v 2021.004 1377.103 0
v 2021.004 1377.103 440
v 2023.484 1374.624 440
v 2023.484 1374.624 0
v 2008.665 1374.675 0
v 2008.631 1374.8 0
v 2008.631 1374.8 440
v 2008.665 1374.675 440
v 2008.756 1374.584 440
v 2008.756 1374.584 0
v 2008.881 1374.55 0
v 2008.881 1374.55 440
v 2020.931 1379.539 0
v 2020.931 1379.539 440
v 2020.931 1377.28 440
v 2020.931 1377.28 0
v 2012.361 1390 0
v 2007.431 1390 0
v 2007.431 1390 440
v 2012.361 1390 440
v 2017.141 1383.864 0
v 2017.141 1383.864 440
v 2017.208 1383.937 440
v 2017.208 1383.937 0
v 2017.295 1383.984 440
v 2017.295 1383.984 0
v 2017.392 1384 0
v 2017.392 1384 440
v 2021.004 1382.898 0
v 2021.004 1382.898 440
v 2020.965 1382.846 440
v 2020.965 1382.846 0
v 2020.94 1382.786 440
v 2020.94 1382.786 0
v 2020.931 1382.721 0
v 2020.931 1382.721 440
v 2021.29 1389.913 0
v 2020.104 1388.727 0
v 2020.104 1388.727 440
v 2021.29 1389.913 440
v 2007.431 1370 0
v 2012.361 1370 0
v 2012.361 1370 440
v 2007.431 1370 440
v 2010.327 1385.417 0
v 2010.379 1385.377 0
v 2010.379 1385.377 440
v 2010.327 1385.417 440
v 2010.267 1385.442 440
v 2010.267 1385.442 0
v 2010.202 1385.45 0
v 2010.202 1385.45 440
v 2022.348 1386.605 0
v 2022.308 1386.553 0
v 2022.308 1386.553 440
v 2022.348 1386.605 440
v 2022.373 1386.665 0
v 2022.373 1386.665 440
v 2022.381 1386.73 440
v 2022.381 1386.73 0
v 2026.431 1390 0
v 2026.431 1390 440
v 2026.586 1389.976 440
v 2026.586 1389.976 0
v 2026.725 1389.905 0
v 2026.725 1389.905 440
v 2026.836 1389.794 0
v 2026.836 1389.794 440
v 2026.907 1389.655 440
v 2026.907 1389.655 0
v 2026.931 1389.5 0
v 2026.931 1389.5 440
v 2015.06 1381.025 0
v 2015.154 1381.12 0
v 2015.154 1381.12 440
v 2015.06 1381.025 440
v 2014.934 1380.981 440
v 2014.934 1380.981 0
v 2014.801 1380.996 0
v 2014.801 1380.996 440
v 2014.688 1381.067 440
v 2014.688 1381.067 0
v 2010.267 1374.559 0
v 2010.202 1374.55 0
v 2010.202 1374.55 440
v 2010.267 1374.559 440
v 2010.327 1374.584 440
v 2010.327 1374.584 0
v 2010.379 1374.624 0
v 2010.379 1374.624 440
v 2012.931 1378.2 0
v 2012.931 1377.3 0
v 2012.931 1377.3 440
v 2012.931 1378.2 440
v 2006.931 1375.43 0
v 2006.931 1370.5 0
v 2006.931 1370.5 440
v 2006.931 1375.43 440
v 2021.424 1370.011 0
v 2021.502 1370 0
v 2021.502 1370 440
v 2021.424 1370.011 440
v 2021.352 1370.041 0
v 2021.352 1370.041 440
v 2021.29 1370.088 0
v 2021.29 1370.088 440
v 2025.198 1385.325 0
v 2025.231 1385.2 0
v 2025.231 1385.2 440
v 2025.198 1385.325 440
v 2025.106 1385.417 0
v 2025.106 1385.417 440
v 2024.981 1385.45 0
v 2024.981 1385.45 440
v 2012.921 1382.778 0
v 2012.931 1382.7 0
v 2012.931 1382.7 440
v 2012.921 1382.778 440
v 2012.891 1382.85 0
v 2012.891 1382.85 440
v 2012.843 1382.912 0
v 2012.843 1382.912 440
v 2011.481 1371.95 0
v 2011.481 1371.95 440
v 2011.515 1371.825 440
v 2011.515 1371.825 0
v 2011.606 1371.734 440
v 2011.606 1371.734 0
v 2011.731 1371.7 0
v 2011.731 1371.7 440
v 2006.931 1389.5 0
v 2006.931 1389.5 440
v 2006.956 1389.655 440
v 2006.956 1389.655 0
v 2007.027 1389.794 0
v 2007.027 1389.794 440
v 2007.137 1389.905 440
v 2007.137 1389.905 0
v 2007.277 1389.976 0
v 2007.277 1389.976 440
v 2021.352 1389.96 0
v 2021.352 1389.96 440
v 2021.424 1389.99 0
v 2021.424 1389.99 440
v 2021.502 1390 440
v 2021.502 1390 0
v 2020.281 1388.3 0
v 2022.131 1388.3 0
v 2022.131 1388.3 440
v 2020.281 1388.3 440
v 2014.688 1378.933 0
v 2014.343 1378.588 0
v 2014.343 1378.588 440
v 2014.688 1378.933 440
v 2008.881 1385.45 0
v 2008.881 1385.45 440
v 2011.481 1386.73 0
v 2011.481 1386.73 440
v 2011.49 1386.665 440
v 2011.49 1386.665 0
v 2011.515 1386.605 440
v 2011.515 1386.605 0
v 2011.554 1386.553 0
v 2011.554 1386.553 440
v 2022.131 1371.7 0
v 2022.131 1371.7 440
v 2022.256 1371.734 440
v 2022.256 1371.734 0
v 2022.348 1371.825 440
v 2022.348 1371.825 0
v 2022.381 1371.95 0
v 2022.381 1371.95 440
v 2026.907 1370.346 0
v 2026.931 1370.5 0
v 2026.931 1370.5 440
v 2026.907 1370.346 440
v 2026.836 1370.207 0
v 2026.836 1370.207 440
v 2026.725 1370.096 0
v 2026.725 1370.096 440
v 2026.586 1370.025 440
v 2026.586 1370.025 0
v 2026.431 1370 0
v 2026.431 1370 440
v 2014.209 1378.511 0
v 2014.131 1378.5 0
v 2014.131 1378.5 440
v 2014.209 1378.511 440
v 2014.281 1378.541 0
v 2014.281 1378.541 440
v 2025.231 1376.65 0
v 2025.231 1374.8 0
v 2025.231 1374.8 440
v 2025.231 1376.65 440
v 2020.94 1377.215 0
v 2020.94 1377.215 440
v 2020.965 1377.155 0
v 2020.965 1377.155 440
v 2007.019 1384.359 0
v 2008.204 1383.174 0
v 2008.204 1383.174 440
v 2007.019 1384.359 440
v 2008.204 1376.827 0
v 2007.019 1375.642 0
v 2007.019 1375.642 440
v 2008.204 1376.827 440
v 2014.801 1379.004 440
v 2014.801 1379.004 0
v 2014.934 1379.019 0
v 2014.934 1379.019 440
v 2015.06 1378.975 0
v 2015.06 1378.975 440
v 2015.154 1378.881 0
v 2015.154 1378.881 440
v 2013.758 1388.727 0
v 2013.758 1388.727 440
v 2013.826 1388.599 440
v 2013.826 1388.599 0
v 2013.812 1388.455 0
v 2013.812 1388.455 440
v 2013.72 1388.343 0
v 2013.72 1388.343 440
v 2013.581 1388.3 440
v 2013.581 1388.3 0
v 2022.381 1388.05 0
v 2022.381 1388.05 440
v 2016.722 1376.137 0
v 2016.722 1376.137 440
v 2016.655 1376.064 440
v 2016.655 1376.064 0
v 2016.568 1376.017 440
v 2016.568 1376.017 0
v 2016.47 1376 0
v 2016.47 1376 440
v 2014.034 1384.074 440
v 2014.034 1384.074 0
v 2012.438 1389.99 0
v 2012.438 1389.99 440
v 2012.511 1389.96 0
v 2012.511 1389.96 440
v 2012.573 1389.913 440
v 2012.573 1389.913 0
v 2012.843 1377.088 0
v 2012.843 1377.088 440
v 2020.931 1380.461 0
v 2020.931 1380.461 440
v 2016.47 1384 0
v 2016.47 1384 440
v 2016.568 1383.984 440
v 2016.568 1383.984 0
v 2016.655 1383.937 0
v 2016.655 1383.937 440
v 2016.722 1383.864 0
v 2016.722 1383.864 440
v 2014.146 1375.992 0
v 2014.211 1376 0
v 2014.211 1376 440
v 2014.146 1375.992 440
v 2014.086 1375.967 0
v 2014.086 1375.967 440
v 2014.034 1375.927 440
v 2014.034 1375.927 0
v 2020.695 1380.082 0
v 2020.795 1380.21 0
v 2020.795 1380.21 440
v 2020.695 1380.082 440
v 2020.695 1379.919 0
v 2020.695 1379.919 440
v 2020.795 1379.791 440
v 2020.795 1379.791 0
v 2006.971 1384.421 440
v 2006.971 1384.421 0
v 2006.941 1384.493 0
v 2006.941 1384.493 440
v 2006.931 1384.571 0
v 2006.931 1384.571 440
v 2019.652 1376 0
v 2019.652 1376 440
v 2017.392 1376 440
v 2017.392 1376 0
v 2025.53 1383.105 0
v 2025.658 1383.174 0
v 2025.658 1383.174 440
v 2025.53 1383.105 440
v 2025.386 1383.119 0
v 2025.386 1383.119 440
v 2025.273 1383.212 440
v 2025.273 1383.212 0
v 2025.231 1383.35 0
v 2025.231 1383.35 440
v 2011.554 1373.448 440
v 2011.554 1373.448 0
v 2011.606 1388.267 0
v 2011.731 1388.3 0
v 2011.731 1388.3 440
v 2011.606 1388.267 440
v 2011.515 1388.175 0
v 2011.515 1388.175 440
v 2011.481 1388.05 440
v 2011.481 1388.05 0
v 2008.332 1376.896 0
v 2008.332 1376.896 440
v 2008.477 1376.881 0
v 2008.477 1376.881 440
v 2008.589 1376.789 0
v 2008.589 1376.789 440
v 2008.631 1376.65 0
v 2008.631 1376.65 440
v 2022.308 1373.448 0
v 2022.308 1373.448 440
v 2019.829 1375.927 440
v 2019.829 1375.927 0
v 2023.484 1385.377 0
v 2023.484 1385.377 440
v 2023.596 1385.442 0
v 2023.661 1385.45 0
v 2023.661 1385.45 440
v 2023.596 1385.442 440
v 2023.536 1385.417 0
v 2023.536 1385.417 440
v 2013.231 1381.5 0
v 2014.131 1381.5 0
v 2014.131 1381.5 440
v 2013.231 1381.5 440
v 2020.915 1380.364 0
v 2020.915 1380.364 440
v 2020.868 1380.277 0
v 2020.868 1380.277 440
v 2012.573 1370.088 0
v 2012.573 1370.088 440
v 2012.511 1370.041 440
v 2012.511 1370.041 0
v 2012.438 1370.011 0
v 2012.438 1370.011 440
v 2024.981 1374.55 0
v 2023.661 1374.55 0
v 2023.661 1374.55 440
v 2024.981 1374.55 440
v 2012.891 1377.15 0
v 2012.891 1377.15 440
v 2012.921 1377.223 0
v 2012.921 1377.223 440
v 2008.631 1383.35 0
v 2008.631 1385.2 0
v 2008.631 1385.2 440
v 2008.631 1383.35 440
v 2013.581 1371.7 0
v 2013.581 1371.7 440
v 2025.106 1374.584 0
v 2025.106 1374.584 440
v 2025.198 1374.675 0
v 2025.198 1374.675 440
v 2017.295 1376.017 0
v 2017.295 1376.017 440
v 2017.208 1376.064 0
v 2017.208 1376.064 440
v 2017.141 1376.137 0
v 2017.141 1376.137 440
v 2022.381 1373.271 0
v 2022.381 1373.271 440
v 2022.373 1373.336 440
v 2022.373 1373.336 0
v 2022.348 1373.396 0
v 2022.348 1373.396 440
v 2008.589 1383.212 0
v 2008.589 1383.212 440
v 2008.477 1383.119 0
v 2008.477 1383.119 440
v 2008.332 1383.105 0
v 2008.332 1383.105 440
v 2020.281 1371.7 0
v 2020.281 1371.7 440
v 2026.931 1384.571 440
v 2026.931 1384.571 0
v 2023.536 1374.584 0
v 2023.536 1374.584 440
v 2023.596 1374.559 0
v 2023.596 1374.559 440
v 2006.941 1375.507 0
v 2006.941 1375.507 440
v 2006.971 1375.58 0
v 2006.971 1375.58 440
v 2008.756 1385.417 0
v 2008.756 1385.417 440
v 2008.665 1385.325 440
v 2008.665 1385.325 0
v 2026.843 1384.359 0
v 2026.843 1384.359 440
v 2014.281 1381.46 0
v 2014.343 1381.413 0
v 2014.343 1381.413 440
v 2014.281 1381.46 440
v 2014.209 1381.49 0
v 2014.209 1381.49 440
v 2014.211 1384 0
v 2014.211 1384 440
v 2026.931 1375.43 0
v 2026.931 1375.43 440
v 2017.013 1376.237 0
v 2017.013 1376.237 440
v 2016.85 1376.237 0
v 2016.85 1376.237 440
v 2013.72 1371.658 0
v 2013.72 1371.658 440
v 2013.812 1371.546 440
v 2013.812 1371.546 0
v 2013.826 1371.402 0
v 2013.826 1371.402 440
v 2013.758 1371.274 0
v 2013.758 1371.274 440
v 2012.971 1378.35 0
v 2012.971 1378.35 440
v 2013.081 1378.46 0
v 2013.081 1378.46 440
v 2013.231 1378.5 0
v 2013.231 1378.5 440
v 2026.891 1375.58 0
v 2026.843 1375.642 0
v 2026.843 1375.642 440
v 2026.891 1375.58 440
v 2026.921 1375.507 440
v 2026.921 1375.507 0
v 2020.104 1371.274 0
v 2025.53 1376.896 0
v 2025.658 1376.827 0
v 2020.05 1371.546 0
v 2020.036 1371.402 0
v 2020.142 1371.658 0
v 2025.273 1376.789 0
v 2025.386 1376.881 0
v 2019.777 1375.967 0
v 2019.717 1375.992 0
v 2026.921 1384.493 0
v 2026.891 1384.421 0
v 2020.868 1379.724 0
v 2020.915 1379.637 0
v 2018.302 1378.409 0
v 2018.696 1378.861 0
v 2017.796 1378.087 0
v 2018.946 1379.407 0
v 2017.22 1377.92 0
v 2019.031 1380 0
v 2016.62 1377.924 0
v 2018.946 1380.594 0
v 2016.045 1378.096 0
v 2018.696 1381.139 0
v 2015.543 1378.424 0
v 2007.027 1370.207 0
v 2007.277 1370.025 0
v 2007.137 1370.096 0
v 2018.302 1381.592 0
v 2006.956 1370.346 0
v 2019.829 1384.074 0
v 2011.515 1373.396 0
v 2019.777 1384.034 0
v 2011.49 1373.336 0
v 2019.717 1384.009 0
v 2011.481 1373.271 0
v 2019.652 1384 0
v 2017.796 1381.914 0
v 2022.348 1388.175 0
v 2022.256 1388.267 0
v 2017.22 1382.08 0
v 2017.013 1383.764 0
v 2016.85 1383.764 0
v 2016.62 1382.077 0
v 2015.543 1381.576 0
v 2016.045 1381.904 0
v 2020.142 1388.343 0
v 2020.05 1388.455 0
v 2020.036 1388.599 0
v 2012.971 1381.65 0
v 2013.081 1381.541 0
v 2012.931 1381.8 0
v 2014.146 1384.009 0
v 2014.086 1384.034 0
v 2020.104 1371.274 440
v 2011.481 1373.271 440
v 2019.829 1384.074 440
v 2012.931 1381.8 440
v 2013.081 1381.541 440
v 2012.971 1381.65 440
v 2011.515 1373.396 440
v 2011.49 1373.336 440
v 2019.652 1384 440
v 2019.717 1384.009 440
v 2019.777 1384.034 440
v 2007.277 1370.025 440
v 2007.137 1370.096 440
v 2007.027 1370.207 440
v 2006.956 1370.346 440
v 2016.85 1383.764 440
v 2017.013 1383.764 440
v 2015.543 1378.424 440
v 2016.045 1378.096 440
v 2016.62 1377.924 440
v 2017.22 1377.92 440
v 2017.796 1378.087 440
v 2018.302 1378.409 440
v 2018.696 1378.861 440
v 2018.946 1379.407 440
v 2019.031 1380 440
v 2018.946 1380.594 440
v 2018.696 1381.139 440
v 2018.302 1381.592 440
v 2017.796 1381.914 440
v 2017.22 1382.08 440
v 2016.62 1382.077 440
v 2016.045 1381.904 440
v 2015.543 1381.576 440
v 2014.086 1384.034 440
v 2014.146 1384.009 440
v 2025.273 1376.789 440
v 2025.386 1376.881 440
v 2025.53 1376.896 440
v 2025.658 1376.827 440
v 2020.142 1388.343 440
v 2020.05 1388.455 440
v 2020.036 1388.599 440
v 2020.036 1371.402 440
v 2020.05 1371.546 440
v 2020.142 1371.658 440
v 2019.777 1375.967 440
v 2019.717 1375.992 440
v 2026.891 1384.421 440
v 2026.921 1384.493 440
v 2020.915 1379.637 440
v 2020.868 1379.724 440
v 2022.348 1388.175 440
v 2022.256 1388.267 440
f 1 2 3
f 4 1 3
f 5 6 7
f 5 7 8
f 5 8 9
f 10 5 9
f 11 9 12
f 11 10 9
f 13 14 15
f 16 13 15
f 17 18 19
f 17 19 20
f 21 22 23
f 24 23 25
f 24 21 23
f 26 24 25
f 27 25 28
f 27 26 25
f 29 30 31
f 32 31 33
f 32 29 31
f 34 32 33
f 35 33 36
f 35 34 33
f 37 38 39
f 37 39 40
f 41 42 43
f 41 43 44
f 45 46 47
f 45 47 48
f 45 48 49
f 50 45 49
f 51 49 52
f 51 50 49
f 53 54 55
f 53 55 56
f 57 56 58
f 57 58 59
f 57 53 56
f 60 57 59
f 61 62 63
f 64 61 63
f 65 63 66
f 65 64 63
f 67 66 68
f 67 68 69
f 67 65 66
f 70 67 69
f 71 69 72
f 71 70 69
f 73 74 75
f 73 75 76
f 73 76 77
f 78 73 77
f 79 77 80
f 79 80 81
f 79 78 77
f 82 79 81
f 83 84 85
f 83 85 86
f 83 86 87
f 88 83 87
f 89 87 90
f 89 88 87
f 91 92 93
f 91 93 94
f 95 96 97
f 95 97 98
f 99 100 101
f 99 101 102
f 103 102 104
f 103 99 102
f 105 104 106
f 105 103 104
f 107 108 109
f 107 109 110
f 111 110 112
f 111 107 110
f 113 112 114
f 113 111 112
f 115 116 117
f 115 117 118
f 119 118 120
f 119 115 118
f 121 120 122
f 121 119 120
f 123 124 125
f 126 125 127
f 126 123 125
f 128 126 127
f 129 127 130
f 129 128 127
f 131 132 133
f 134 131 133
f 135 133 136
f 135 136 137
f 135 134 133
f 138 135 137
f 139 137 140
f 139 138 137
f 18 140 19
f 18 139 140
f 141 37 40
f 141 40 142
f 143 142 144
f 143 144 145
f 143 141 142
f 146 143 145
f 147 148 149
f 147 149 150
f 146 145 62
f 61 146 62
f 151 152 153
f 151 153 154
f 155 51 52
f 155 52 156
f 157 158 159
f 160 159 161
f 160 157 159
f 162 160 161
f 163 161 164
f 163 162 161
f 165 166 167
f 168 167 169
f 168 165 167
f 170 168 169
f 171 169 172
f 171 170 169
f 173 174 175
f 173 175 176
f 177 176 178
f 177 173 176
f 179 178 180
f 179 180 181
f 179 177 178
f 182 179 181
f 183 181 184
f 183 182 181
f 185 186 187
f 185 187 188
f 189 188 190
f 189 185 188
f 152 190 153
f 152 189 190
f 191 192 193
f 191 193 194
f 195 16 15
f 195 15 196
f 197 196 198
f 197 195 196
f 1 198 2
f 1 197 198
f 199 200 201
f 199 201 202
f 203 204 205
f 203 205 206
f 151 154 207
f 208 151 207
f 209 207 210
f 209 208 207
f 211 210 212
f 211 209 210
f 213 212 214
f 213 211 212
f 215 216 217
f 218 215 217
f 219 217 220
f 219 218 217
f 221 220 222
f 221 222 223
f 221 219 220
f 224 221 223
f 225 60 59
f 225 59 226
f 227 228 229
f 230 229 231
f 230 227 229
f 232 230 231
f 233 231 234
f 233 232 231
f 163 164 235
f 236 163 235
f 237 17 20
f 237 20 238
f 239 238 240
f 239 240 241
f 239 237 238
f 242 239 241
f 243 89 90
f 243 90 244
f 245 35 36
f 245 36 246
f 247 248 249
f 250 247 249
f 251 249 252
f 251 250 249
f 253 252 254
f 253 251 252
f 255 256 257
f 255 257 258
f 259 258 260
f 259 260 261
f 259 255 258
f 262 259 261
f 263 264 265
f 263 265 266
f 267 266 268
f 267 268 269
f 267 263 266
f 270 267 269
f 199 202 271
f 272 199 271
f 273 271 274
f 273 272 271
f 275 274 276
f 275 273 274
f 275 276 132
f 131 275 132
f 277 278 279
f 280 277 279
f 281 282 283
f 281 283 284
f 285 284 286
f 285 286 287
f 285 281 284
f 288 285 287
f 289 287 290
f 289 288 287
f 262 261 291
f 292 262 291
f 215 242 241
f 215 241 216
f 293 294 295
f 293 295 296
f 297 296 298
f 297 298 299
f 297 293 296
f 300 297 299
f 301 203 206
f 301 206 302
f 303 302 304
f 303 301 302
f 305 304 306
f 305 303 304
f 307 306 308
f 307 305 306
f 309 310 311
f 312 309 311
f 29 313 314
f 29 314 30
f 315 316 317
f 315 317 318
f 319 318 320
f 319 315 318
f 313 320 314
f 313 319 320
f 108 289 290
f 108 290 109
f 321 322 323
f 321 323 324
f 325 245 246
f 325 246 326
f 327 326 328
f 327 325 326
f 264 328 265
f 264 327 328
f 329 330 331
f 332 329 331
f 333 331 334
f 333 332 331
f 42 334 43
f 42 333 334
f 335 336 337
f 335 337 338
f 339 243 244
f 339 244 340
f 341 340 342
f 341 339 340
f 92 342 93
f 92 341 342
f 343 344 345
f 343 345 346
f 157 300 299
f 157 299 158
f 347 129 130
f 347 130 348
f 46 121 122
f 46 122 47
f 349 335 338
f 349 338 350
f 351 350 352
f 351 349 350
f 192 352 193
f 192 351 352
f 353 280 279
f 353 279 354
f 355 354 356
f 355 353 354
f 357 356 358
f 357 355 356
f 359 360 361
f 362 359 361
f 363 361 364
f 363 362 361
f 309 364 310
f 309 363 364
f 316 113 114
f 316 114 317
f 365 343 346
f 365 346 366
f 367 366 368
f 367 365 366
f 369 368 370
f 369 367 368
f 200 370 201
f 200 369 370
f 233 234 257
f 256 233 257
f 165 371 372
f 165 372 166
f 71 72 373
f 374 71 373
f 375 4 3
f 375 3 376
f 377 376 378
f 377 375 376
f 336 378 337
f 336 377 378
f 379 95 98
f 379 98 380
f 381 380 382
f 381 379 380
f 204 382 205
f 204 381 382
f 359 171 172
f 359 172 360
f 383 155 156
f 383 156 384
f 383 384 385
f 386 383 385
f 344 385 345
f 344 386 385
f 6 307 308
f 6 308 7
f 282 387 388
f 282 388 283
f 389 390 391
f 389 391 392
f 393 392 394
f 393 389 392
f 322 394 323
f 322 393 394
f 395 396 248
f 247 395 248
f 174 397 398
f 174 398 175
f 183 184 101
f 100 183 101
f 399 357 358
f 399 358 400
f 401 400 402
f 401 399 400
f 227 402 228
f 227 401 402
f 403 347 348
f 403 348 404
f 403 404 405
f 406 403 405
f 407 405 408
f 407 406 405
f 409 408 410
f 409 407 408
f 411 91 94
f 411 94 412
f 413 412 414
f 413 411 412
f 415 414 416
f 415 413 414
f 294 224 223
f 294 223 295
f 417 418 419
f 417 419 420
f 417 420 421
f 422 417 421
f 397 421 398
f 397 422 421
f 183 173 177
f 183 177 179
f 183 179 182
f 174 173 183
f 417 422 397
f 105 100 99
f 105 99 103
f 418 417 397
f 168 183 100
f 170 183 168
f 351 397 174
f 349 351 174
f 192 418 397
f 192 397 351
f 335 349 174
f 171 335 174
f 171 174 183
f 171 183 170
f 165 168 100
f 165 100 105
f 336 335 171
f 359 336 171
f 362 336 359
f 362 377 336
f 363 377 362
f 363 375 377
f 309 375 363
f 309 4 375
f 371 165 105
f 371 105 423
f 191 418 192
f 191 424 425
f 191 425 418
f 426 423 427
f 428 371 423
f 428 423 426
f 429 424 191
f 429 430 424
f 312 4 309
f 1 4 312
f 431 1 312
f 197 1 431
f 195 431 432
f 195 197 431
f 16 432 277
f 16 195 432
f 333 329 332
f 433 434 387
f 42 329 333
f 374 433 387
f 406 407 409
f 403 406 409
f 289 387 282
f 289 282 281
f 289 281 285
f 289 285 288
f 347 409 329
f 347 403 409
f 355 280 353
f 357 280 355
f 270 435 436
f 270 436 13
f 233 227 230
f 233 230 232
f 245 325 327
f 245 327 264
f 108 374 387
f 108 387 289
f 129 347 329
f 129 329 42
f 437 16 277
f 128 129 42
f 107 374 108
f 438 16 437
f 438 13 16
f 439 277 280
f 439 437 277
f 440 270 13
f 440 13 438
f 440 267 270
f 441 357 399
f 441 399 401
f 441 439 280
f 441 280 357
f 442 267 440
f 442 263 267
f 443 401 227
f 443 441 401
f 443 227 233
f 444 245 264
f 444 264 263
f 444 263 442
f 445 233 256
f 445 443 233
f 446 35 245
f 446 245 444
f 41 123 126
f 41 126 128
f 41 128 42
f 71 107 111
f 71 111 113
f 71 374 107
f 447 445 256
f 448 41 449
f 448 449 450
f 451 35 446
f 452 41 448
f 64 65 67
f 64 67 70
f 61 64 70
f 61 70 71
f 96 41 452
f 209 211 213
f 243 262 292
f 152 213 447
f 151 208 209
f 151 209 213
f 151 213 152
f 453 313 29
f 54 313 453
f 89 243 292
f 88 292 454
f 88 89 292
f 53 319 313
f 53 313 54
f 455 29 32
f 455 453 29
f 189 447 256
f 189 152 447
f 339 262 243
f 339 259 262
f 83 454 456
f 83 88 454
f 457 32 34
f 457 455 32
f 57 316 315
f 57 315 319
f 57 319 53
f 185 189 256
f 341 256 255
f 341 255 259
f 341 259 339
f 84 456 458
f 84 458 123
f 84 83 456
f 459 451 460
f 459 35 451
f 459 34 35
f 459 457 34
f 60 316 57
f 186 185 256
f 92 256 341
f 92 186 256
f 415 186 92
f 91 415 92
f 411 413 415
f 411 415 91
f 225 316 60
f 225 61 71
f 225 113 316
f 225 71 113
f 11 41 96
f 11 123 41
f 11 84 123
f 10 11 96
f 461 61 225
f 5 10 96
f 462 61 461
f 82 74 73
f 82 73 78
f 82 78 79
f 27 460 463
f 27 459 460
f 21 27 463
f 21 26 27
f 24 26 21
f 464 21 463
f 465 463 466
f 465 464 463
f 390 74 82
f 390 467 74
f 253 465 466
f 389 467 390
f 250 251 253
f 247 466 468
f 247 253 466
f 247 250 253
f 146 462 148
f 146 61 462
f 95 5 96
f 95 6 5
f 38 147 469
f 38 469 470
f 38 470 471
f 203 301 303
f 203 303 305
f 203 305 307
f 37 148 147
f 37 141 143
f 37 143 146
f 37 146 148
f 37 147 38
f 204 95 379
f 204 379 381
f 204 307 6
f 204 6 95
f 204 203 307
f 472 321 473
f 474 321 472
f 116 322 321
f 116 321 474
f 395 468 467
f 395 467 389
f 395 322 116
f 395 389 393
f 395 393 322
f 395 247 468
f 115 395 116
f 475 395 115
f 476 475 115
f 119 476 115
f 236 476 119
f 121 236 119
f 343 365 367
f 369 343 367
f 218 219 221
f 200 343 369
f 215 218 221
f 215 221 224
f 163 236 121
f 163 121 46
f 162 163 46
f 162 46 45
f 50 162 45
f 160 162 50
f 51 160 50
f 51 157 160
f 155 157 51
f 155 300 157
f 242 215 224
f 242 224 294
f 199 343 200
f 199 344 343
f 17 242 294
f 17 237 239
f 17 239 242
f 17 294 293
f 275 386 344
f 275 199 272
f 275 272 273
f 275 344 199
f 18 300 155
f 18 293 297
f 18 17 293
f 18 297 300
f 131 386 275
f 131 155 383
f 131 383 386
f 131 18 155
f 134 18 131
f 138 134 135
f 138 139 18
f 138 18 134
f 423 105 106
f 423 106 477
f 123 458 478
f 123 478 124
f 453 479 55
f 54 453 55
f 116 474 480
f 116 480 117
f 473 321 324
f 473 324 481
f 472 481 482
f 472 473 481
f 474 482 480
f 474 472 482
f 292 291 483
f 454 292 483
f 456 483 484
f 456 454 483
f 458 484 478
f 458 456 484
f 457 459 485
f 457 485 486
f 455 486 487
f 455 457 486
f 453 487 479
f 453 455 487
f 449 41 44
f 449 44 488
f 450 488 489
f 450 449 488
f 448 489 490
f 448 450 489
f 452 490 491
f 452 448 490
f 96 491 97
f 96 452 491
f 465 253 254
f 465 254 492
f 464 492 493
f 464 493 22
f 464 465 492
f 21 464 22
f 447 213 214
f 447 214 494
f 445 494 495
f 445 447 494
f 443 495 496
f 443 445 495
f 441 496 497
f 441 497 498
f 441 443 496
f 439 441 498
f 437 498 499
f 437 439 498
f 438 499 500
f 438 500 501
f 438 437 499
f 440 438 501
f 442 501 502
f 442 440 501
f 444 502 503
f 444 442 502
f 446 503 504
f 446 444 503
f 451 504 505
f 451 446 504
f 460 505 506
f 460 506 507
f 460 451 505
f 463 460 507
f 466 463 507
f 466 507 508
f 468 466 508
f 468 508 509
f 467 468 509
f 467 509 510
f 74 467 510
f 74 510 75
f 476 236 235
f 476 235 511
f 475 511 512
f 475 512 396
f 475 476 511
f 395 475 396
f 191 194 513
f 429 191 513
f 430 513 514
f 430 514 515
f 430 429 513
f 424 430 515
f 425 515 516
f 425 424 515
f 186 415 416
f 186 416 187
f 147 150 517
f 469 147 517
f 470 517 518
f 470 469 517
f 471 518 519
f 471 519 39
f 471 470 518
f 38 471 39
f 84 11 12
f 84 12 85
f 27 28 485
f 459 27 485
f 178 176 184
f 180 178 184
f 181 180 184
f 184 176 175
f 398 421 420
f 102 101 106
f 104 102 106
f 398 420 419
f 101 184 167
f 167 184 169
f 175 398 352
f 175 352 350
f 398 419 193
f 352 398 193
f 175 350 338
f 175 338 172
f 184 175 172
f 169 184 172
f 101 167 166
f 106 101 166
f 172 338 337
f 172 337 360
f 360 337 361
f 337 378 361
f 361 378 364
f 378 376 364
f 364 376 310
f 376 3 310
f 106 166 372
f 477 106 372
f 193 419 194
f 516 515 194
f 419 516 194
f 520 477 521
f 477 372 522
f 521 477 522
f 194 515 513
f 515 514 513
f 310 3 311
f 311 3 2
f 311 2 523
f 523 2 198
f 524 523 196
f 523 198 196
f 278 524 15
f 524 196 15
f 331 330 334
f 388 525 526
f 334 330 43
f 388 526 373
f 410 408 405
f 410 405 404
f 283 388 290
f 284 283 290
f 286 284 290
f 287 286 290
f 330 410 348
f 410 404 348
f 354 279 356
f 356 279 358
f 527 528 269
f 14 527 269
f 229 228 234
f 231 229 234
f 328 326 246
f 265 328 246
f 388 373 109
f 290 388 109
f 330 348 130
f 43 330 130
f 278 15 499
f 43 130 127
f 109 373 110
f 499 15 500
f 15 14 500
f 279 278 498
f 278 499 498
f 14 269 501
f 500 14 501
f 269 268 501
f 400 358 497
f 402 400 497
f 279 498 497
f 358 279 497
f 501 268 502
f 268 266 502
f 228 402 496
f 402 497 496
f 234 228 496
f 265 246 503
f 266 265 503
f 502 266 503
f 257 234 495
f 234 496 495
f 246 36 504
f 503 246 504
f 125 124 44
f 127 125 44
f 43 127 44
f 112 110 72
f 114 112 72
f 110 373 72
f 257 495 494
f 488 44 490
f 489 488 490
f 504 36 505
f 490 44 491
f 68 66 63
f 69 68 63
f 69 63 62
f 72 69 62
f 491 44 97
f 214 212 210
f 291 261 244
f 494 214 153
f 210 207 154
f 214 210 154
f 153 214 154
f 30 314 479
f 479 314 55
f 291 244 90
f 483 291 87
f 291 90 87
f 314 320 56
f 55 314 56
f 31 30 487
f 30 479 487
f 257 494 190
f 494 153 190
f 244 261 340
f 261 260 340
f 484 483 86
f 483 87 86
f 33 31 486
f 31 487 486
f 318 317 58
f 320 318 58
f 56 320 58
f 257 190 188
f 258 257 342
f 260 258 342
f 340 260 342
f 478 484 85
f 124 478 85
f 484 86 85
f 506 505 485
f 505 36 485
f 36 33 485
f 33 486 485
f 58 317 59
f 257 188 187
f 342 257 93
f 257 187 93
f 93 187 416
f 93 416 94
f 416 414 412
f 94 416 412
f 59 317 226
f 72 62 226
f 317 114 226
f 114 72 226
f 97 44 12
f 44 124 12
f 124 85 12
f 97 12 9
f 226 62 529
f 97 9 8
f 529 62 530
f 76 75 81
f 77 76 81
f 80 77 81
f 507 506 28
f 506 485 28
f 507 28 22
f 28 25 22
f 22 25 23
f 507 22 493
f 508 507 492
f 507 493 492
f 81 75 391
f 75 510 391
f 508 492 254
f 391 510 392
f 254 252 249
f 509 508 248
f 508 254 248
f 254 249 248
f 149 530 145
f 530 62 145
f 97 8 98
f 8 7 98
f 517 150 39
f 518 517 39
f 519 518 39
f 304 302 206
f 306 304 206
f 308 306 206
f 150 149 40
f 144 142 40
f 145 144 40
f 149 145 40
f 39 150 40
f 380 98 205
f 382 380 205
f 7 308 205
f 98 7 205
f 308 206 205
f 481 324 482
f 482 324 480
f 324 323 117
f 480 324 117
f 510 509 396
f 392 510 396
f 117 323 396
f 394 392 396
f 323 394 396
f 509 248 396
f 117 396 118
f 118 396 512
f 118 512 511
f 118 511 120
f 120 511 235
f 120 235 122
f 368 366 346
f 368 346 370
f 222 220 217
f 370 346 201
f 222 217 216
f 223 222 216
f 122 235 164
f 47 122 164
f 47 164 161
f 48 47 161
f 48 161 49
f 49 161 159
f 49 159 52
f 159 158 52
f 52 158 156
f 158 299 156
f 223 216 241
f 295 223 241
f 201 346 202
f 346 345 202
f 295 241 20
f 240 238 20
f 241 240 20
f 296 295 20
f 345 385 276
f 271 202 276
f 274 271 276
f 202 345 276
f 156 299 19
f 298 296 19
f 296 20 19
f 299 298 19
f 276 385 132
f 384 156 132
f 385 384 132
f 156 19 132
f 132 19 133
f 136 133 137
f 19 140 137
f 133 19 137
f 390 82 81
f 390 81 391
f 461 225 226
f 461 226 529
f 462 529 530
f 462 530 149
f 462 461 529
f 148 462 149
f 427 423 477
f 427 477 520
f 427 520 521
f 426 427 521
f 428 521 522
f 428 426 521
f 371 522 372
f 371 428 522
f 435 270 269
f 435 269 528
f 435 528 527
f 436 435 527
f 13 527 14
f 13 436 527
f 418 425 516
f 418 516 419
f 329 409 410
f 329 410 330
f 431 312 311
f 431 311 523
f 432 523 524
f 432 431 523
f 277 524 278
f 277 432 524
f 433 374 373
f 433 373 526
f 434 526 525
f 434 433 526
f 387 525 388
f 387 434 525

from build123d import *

# Parameters (mm, degrees)
BOSS_EXTRUDE1_DEPTH = 440


with BuildPart() as part:
    # Model → Boss-Extrude1 (new body)
    with BuildSketch(Plane.XY):
        with BuildLine():
            Line((2013.231211125, 1378.500393717), (2014.131175411, 1378.500393717))
            ThreePointArc((2014.131175411, 1378.500393717), (2014.245980441, 1378.523229857), (2014.343307446, 1378.588261683))
            Line((2014.343307446, 1378.588261683), (2014.688390533, 1378.93334477))
            ThreePointArc((2014.688390533, 1378.93334477), (2014.933942847, 1379.019345399), (2015.154358637, 1378.881110358))
            ThreePointArc((2015.154358637, 1378.881110358), (2019.031211125, 1380.000393717), (2015.154358637, 1381.119677076))
            ThreePointArc((2015.154358637, 1381.119677076), (2014.933942847, 1380.981442035), (2014.688390533, 1381.067442664))
            Line((2014.688390533, 1381.067442664), (2014.343307446, 1381.412525751))
            ThreePointArc((2014.343307446, 1381.412525751), (2014.245980441, 1381.477557577), (2014.131175412, 1381.500393717))
            Line((2014.131175412, 1381.500393717), (2013.231211125, 1381.500393717))
            ThreePointArc((2013.231211125, 1381.500393717), (2013.01907909, 1381.588261683), (2012.931211125, 1381.800393717))
            Line((2012.931211125, 1381.800393717), (2012.931211125, 1382.700358004))
            ThreePointArc((2012.931211125, 1382.700358004), (2012.908374985, 1382.815163033), (2012.843343159, 1382.912490038))
            Line((2012.843343159, 1382.912490038), (2010.378662785, 1385.377170412))
            ThreePointArc((2010.378662785, 1385.377170412), (2010.297556948, 1385.4313636), (2010.20188609, 1385.450393717))
            Line((2010.20188609, 1385.450393717), (2008.881211125, 1385.450393717))
            ThreePointArc((2008.881211125, 1385.450393717), (2008.70443443, 1385.377170412), (2008.631211125, 1385.200393717))
            Line((2008.631211125, 1385.200393717), (2008.631211125, 1383.350393717))
            ThreePointArc((2008.631211125, 1383.350393717), (2008.476881983, 1383.119423834), (2008.20443443, 1383.173617022))
            Line((2008.20443443, 1383.173617022), (2007.01907909, 1384.358972361))
            ThreePointArc((2007.01907909, 1384.358972361), (2006.954047265, 1384.456299366), (2006.931211125, 1384.571104395))
            Line((2006.931211125, 1384.571104395), (2006.931211125, 1389.500393717))
            ThreePointArc((2006.931211125, 1389.500393717), (2007.077657734, 1389.853947108), (2007.431211125, 1390.000393717))
            Line((2007.431211125, 1390.000393717), (2012.360500447, 1390.000393717))
            ThreePointArc((2012.360500447, 1390.000393717), (2012.475305476, 1389.977557577), (2012.572632481, 1389.912525752))
            Line((2012.572632481, 1389.912525752), (2013.75798782, 1388.727170412))
            ThreePointArc((2013.75798782, 1388.727170412), (2013.812181008, 1388.454722859), (2013.581211125, 1388.300393717))
            Line((2013.581211125, 1388.300393717), (2011.731211125, 1388.300393717))
            ThreePointArc((2011.731211125, 1388.300393717), (2011.55443443, 1388.227170412), (2011.481211125, 1388.050393717))
            Line((2011.481211125, 1388.050393717), (2011.481211125, 1386.729718752))
            ThreePointArc((2011.481211125, 1386.729718752), (2011.500241242, 1386.634047894), (2011.55443443, 1386.552942057))
            Line((2011.55443443, 1386.552942057), (2014.033759465, 1384.073617022))
            ThreePointArc((2014.033759465, 1384.073617022), (2014.114865302, 1384.019423834), (2014.21053616, 1384.000393717))
            Line((2014.21053616, 1384.000393717), (2016.470233902, 1384.000393717))
            ThreePointArc((2016.470233902, 1384.000393717), (2016.61325329, 1383.964108439), (2016.721676023, 1383.864030081))
            ThreePointArc((2016.721676023, 1383.864030081), (2016.931211125, 1383.750393717), (2017.140746226, 1383.864030081))
            ThreePointArc((2017.140746226, 1383.864030081), (2017.24916896, 1383.964108439), (2017.392188348, 1384.000393717))
            Line((2017.392188348, 1384.000393717), (2019.65188609, 1384.000393717))
            ThreePointArc((2019.65188609, 1384.000393717), (2019.747556948, 1384.019423834), (2019.828662785, 1384.073617022))
            Line((2019.828662785, 1384.073617022), (2022.30798782, 1386.552942057))
            ThreePointArc((2022.30798782, 1386.552942057), (2022.362181008, 1386.634047894), (2022.381211125, 1386.729718752))
            Line((2022.381211125, 1386.729718752), (2022.381211125, 1388.050393717))
            ThreePointArc((2022.381211125, 1388.050393717), (2022.30798782, 1388.227170412), (2022.131211125, 1388.300393717))
            Line((2022.131211125, 1388.300393717), (2020.281211125, 1388.300393717))
            ThreePointArc((2020.281211125, 1388.300393717), (2020.050241242, 1388.454722859), (2020.10443443, 1388.727170412))
            Line((2020.10443443, 1388.727170412), (2021.289789769, 1389.912525752))
            ThreePointArc((2021.289789769, 1389.912525752), (2021.387116773, 1389.977557577), (2021.501921803, 1390.000393717))
            Line((2021.501921803, 1390.000393717), (2026.431211125, 1390.000393717))
            ThreePointArc((2026.431211125, 1390.000393717), (2026.784764515, 1389.853947108), (2026.931211125, 1389.500393717))
            Line((2026.931211125, 1389.500393717), (2026.931211125, 1384.571104395))
            ThreePointArc((2026.931211125, 1384.571104395), (2026.908374985, 1384.456299366), (2026.843343159, 1384.358972361))
            Line((2026.843343159, 1384.358972361), (2025.65798782, 1383.173617022))
            ThreePointArc((2025.65798782, 1383.173617022), (2025.385540267, 1383.119423834), (2025.231211125, 1383.350393717))
            Line((2025.231211125, 1383.350393717), (2025.231211125, 1385.200393717))
            ThreePointArc((2025.231211125, 1385.200393717), (2025.15798782, 1385.377170412), (2024.981211125, 1385.450393717))
            Line((2024.981211125, 1385.450393717), (2023.66053616, 1385.450393717))
            ThreePointArc((2023.66053616, 1385.450393717), (2023.564865302, 1385.4313636), (2023.483759465, 1385.377170412))
            Line((2023.483759465, 1385.377170412), (2021.00443443, 1382.897845377))
            ThreePointArc((2021.00443443, 1382.897845377), (2020.950241242, 1382.81673954), (2020.931211125, 1382.721068682))
            Line((2020.931211125, 1382.721068682), (2020.931211125, 1380.46137094))
            ThreePointArc((2020.931211125, 1380.46137094), (2020.894925847, 1380.318351552), (2020.794847489, 1380.209928818))
            ThreePointArc((2020.794847489, 1380.209928818), (2020.681211125, 1380.000393717), (2020.794847488, 1379.790858616))
            ThreePointArc((2020.794847488, 1379.790858616), (2020.894925847, 1379.682435882), (2020.931211125, 1379.539416494))
            Line((2020.931211125, 1379.539416494), (2020.931211125, 1377.279718752))
            ThreePointArc((2020.931211125, 1377.279718752), (2020.950241242, 1377.184047894), (2021.00443443, 1377.102942057))
            Line((2021.00443443, 1377.102942057), (2023.483759465, 1374.623617022))
            ThreePointArc((2023.483759465, 1374.623617022), (2023.564865302, 1374.569423834), (2023.66053616, 1374.550393717))
            Line((2023.66053616, 1374.550393717), (2024.981211125, 1374.550393717))
            ThreePointArc((2024.981211125, 1374.550393717), (2025.15798782, 1374.623617022), (2025.231211125, 1374.800393717))
            Line((2025.231211125, 1374.800393717), (2025.231211125, 1376.650393717))
            ThreePointArc((2025.231211125, 1376.650393717), (2025.385540267, 1376.8813636), (2025.65798782, 1376.827170412))
            Line((2025.65798782, 1376.827170412), (2026.843343159, 1375.641815073))
            ThreePointArc((2026.843343159, 1375.641815073), (2026.908374985, 1375.544488069), (2026.931211125, 1375.429683039))
            Line((2026.931211125, 1375.429683039), (2026.931211125, 1370.500393717))
            ThreePointArc((2026.931211125, 1370.500393717), (2026.784764515, 1370.146840327), (2026.431211125, 1370.000393717))
            Line((2026.431211125, 1370.000393717), (2021.501921803, 1370.000393717))
            ThreePointArc((2021.501921803, 1370.000393717), (2021.387116773, 1370.023229857), (2021.289789769, 1370.088261683))
            Line((2021.289789769, 1370.088261683), (2020.10443443, 1371.273617022))
            ThreePointArc((2020.10443443, 1371.273617022), (2020.050241242, 1371.546064575), (2020.281211125, 1371.700393717))
            Line((2020.281211125, 1371.700393717), (2022.131211125, 1371.700393717))
            ThreePointArc((2022.131211125, 1371.700393717), (2022.30798782, 1371.773617022), (2022.381211125, 1371.950393717))
            Line((2022.381211125, 1371.950393717), (2022.381211125, 1373.271068682))
            ThreePointArc((2022.381211125, 1373.271068682), (2022.362181008, 1373.36673954), (2022.30798782, 1373.447845377))
            Line((2022.30798782, 1373.447845377), (2019.828662785, 1375.927170412))
            ThreePointArc((2019.828662785, 1375.927170412), (2019.747556948, 1375.9813636), (2019.65188609, 1376.000393717))
            Line((2019.65188609, 1376.000393717), (2017.392188348, 1376.000393717))
            ThreePointArc((2017.392188348, 1376.000393717), (2017.24916896, 1376.036678995), (2017.140746226, 1376.136757353))
            ThreePointArc((2017.140746226, 1376.136757353), (2016.931211125, 1376.250393717), (2016.721676023, 1376.136757354))
            ThreePointArc((2016.721676023, 1376.136757354), (2016.61325329, 1376.036678995), (2016.470233902, 1376.000393717))
            Line((2016.470233902, 1376.000393717), (2014.21053616, 1376.000393717))
            ThreePointArc((2014.21053616, 1376.000393717), (2014.114865302, 1375.9813636), (2014.033759465, 1375.927170412))
            Line((2014.033759465, 1375.927170412), (2011.55443443, 1373.447845377))
            ThreePointArc((2011.55443443, 1373.447845377), (2011.500241242, 1373.36673954), (2011.481211125, 1373.271068682))
            Line((2011.481211125, 1373.271068682), (2011.481211125, 1371.950393717))
            ThreePointArc((2011.481211125, 1371.950393717), (2011.55443443, 1371.773617022), (2011.731211125, 1371.700393717))
            Line((2011.731211125, 1371.700393717), (2013.581211125, 1371.700393717))
            ThreePointArc((2013.581211125, 1371.700393717), (2013.812181008, 1371.546064575), (2013.75798782, 1371.273617022))
            Line((2013.75798782, 1371.273617022), (2012.572632481, 1370.088261683))
            ThreePointArc((2012.572632481, 1370.088261683), (2012.475305476, 1370.023229857), (2012.360500447, 1370.000393717))
            Line((2012.360500447, 1370.000393717), (2007.431211125, 1370.000393717))
            ThreePointArc((2007.431211125, 1370.000393717), (2007.077657734, 1370.146840327), (2006.931211125, 1370.500393717))
            Line((2006.931211125, 1370.500393717), (2006.931211125, 1375.429683039))
            ThreePointArc((2006.931211125, 1375.429683039), (2006.954047265, 1375.544488069), (2007.01907909, 1375.641815073))
            Line((2007.01907909, 1375.641815073), (2008.20443443, 1376.827170412))
            ThreePointArc((2008.20443443, 1376.827170412), (2008.476881983, 1376.8813636), (2008.631211125, 1376.650393717))
            Line((2008.631211125, 1376.650393717), (2008.631211125, 1374.800393717))
            ThreePointArc((2008.631211125, 1374.800393717), (2008.70443443, 1374.623617022), (2008.881211125, 1374.550393717))
            Line((2008.881211125, 1374.550393717), (2010.20188609, 1374.550393717))
            ThreePointArc((2010.20188609, 1374.550393717), (2010.297556948, 1374.569423834), (2010.378662785, 1374.623617022))
            Line((2010.378662785, 1374.623617022), (2012.843343159, 1377.088297396))
            ThreePointArc((2012.843343159, 1377.088297396), (2012.908374985, 1377.185624401), (2012.931211125, 1377.300429431))
            Line((2012.931211125, 1377.300429431), (2012.931211125, 1378.200393717))
            ThreePointArc((2012.931211125, 1378.200393717), (2013.01907909, 1378.412525751), (2013.231211125, 1378.500393717))
        make_face()
    extrude(amount=BOSS_EXTRUDE1_DEPTH)


solid = part.part
